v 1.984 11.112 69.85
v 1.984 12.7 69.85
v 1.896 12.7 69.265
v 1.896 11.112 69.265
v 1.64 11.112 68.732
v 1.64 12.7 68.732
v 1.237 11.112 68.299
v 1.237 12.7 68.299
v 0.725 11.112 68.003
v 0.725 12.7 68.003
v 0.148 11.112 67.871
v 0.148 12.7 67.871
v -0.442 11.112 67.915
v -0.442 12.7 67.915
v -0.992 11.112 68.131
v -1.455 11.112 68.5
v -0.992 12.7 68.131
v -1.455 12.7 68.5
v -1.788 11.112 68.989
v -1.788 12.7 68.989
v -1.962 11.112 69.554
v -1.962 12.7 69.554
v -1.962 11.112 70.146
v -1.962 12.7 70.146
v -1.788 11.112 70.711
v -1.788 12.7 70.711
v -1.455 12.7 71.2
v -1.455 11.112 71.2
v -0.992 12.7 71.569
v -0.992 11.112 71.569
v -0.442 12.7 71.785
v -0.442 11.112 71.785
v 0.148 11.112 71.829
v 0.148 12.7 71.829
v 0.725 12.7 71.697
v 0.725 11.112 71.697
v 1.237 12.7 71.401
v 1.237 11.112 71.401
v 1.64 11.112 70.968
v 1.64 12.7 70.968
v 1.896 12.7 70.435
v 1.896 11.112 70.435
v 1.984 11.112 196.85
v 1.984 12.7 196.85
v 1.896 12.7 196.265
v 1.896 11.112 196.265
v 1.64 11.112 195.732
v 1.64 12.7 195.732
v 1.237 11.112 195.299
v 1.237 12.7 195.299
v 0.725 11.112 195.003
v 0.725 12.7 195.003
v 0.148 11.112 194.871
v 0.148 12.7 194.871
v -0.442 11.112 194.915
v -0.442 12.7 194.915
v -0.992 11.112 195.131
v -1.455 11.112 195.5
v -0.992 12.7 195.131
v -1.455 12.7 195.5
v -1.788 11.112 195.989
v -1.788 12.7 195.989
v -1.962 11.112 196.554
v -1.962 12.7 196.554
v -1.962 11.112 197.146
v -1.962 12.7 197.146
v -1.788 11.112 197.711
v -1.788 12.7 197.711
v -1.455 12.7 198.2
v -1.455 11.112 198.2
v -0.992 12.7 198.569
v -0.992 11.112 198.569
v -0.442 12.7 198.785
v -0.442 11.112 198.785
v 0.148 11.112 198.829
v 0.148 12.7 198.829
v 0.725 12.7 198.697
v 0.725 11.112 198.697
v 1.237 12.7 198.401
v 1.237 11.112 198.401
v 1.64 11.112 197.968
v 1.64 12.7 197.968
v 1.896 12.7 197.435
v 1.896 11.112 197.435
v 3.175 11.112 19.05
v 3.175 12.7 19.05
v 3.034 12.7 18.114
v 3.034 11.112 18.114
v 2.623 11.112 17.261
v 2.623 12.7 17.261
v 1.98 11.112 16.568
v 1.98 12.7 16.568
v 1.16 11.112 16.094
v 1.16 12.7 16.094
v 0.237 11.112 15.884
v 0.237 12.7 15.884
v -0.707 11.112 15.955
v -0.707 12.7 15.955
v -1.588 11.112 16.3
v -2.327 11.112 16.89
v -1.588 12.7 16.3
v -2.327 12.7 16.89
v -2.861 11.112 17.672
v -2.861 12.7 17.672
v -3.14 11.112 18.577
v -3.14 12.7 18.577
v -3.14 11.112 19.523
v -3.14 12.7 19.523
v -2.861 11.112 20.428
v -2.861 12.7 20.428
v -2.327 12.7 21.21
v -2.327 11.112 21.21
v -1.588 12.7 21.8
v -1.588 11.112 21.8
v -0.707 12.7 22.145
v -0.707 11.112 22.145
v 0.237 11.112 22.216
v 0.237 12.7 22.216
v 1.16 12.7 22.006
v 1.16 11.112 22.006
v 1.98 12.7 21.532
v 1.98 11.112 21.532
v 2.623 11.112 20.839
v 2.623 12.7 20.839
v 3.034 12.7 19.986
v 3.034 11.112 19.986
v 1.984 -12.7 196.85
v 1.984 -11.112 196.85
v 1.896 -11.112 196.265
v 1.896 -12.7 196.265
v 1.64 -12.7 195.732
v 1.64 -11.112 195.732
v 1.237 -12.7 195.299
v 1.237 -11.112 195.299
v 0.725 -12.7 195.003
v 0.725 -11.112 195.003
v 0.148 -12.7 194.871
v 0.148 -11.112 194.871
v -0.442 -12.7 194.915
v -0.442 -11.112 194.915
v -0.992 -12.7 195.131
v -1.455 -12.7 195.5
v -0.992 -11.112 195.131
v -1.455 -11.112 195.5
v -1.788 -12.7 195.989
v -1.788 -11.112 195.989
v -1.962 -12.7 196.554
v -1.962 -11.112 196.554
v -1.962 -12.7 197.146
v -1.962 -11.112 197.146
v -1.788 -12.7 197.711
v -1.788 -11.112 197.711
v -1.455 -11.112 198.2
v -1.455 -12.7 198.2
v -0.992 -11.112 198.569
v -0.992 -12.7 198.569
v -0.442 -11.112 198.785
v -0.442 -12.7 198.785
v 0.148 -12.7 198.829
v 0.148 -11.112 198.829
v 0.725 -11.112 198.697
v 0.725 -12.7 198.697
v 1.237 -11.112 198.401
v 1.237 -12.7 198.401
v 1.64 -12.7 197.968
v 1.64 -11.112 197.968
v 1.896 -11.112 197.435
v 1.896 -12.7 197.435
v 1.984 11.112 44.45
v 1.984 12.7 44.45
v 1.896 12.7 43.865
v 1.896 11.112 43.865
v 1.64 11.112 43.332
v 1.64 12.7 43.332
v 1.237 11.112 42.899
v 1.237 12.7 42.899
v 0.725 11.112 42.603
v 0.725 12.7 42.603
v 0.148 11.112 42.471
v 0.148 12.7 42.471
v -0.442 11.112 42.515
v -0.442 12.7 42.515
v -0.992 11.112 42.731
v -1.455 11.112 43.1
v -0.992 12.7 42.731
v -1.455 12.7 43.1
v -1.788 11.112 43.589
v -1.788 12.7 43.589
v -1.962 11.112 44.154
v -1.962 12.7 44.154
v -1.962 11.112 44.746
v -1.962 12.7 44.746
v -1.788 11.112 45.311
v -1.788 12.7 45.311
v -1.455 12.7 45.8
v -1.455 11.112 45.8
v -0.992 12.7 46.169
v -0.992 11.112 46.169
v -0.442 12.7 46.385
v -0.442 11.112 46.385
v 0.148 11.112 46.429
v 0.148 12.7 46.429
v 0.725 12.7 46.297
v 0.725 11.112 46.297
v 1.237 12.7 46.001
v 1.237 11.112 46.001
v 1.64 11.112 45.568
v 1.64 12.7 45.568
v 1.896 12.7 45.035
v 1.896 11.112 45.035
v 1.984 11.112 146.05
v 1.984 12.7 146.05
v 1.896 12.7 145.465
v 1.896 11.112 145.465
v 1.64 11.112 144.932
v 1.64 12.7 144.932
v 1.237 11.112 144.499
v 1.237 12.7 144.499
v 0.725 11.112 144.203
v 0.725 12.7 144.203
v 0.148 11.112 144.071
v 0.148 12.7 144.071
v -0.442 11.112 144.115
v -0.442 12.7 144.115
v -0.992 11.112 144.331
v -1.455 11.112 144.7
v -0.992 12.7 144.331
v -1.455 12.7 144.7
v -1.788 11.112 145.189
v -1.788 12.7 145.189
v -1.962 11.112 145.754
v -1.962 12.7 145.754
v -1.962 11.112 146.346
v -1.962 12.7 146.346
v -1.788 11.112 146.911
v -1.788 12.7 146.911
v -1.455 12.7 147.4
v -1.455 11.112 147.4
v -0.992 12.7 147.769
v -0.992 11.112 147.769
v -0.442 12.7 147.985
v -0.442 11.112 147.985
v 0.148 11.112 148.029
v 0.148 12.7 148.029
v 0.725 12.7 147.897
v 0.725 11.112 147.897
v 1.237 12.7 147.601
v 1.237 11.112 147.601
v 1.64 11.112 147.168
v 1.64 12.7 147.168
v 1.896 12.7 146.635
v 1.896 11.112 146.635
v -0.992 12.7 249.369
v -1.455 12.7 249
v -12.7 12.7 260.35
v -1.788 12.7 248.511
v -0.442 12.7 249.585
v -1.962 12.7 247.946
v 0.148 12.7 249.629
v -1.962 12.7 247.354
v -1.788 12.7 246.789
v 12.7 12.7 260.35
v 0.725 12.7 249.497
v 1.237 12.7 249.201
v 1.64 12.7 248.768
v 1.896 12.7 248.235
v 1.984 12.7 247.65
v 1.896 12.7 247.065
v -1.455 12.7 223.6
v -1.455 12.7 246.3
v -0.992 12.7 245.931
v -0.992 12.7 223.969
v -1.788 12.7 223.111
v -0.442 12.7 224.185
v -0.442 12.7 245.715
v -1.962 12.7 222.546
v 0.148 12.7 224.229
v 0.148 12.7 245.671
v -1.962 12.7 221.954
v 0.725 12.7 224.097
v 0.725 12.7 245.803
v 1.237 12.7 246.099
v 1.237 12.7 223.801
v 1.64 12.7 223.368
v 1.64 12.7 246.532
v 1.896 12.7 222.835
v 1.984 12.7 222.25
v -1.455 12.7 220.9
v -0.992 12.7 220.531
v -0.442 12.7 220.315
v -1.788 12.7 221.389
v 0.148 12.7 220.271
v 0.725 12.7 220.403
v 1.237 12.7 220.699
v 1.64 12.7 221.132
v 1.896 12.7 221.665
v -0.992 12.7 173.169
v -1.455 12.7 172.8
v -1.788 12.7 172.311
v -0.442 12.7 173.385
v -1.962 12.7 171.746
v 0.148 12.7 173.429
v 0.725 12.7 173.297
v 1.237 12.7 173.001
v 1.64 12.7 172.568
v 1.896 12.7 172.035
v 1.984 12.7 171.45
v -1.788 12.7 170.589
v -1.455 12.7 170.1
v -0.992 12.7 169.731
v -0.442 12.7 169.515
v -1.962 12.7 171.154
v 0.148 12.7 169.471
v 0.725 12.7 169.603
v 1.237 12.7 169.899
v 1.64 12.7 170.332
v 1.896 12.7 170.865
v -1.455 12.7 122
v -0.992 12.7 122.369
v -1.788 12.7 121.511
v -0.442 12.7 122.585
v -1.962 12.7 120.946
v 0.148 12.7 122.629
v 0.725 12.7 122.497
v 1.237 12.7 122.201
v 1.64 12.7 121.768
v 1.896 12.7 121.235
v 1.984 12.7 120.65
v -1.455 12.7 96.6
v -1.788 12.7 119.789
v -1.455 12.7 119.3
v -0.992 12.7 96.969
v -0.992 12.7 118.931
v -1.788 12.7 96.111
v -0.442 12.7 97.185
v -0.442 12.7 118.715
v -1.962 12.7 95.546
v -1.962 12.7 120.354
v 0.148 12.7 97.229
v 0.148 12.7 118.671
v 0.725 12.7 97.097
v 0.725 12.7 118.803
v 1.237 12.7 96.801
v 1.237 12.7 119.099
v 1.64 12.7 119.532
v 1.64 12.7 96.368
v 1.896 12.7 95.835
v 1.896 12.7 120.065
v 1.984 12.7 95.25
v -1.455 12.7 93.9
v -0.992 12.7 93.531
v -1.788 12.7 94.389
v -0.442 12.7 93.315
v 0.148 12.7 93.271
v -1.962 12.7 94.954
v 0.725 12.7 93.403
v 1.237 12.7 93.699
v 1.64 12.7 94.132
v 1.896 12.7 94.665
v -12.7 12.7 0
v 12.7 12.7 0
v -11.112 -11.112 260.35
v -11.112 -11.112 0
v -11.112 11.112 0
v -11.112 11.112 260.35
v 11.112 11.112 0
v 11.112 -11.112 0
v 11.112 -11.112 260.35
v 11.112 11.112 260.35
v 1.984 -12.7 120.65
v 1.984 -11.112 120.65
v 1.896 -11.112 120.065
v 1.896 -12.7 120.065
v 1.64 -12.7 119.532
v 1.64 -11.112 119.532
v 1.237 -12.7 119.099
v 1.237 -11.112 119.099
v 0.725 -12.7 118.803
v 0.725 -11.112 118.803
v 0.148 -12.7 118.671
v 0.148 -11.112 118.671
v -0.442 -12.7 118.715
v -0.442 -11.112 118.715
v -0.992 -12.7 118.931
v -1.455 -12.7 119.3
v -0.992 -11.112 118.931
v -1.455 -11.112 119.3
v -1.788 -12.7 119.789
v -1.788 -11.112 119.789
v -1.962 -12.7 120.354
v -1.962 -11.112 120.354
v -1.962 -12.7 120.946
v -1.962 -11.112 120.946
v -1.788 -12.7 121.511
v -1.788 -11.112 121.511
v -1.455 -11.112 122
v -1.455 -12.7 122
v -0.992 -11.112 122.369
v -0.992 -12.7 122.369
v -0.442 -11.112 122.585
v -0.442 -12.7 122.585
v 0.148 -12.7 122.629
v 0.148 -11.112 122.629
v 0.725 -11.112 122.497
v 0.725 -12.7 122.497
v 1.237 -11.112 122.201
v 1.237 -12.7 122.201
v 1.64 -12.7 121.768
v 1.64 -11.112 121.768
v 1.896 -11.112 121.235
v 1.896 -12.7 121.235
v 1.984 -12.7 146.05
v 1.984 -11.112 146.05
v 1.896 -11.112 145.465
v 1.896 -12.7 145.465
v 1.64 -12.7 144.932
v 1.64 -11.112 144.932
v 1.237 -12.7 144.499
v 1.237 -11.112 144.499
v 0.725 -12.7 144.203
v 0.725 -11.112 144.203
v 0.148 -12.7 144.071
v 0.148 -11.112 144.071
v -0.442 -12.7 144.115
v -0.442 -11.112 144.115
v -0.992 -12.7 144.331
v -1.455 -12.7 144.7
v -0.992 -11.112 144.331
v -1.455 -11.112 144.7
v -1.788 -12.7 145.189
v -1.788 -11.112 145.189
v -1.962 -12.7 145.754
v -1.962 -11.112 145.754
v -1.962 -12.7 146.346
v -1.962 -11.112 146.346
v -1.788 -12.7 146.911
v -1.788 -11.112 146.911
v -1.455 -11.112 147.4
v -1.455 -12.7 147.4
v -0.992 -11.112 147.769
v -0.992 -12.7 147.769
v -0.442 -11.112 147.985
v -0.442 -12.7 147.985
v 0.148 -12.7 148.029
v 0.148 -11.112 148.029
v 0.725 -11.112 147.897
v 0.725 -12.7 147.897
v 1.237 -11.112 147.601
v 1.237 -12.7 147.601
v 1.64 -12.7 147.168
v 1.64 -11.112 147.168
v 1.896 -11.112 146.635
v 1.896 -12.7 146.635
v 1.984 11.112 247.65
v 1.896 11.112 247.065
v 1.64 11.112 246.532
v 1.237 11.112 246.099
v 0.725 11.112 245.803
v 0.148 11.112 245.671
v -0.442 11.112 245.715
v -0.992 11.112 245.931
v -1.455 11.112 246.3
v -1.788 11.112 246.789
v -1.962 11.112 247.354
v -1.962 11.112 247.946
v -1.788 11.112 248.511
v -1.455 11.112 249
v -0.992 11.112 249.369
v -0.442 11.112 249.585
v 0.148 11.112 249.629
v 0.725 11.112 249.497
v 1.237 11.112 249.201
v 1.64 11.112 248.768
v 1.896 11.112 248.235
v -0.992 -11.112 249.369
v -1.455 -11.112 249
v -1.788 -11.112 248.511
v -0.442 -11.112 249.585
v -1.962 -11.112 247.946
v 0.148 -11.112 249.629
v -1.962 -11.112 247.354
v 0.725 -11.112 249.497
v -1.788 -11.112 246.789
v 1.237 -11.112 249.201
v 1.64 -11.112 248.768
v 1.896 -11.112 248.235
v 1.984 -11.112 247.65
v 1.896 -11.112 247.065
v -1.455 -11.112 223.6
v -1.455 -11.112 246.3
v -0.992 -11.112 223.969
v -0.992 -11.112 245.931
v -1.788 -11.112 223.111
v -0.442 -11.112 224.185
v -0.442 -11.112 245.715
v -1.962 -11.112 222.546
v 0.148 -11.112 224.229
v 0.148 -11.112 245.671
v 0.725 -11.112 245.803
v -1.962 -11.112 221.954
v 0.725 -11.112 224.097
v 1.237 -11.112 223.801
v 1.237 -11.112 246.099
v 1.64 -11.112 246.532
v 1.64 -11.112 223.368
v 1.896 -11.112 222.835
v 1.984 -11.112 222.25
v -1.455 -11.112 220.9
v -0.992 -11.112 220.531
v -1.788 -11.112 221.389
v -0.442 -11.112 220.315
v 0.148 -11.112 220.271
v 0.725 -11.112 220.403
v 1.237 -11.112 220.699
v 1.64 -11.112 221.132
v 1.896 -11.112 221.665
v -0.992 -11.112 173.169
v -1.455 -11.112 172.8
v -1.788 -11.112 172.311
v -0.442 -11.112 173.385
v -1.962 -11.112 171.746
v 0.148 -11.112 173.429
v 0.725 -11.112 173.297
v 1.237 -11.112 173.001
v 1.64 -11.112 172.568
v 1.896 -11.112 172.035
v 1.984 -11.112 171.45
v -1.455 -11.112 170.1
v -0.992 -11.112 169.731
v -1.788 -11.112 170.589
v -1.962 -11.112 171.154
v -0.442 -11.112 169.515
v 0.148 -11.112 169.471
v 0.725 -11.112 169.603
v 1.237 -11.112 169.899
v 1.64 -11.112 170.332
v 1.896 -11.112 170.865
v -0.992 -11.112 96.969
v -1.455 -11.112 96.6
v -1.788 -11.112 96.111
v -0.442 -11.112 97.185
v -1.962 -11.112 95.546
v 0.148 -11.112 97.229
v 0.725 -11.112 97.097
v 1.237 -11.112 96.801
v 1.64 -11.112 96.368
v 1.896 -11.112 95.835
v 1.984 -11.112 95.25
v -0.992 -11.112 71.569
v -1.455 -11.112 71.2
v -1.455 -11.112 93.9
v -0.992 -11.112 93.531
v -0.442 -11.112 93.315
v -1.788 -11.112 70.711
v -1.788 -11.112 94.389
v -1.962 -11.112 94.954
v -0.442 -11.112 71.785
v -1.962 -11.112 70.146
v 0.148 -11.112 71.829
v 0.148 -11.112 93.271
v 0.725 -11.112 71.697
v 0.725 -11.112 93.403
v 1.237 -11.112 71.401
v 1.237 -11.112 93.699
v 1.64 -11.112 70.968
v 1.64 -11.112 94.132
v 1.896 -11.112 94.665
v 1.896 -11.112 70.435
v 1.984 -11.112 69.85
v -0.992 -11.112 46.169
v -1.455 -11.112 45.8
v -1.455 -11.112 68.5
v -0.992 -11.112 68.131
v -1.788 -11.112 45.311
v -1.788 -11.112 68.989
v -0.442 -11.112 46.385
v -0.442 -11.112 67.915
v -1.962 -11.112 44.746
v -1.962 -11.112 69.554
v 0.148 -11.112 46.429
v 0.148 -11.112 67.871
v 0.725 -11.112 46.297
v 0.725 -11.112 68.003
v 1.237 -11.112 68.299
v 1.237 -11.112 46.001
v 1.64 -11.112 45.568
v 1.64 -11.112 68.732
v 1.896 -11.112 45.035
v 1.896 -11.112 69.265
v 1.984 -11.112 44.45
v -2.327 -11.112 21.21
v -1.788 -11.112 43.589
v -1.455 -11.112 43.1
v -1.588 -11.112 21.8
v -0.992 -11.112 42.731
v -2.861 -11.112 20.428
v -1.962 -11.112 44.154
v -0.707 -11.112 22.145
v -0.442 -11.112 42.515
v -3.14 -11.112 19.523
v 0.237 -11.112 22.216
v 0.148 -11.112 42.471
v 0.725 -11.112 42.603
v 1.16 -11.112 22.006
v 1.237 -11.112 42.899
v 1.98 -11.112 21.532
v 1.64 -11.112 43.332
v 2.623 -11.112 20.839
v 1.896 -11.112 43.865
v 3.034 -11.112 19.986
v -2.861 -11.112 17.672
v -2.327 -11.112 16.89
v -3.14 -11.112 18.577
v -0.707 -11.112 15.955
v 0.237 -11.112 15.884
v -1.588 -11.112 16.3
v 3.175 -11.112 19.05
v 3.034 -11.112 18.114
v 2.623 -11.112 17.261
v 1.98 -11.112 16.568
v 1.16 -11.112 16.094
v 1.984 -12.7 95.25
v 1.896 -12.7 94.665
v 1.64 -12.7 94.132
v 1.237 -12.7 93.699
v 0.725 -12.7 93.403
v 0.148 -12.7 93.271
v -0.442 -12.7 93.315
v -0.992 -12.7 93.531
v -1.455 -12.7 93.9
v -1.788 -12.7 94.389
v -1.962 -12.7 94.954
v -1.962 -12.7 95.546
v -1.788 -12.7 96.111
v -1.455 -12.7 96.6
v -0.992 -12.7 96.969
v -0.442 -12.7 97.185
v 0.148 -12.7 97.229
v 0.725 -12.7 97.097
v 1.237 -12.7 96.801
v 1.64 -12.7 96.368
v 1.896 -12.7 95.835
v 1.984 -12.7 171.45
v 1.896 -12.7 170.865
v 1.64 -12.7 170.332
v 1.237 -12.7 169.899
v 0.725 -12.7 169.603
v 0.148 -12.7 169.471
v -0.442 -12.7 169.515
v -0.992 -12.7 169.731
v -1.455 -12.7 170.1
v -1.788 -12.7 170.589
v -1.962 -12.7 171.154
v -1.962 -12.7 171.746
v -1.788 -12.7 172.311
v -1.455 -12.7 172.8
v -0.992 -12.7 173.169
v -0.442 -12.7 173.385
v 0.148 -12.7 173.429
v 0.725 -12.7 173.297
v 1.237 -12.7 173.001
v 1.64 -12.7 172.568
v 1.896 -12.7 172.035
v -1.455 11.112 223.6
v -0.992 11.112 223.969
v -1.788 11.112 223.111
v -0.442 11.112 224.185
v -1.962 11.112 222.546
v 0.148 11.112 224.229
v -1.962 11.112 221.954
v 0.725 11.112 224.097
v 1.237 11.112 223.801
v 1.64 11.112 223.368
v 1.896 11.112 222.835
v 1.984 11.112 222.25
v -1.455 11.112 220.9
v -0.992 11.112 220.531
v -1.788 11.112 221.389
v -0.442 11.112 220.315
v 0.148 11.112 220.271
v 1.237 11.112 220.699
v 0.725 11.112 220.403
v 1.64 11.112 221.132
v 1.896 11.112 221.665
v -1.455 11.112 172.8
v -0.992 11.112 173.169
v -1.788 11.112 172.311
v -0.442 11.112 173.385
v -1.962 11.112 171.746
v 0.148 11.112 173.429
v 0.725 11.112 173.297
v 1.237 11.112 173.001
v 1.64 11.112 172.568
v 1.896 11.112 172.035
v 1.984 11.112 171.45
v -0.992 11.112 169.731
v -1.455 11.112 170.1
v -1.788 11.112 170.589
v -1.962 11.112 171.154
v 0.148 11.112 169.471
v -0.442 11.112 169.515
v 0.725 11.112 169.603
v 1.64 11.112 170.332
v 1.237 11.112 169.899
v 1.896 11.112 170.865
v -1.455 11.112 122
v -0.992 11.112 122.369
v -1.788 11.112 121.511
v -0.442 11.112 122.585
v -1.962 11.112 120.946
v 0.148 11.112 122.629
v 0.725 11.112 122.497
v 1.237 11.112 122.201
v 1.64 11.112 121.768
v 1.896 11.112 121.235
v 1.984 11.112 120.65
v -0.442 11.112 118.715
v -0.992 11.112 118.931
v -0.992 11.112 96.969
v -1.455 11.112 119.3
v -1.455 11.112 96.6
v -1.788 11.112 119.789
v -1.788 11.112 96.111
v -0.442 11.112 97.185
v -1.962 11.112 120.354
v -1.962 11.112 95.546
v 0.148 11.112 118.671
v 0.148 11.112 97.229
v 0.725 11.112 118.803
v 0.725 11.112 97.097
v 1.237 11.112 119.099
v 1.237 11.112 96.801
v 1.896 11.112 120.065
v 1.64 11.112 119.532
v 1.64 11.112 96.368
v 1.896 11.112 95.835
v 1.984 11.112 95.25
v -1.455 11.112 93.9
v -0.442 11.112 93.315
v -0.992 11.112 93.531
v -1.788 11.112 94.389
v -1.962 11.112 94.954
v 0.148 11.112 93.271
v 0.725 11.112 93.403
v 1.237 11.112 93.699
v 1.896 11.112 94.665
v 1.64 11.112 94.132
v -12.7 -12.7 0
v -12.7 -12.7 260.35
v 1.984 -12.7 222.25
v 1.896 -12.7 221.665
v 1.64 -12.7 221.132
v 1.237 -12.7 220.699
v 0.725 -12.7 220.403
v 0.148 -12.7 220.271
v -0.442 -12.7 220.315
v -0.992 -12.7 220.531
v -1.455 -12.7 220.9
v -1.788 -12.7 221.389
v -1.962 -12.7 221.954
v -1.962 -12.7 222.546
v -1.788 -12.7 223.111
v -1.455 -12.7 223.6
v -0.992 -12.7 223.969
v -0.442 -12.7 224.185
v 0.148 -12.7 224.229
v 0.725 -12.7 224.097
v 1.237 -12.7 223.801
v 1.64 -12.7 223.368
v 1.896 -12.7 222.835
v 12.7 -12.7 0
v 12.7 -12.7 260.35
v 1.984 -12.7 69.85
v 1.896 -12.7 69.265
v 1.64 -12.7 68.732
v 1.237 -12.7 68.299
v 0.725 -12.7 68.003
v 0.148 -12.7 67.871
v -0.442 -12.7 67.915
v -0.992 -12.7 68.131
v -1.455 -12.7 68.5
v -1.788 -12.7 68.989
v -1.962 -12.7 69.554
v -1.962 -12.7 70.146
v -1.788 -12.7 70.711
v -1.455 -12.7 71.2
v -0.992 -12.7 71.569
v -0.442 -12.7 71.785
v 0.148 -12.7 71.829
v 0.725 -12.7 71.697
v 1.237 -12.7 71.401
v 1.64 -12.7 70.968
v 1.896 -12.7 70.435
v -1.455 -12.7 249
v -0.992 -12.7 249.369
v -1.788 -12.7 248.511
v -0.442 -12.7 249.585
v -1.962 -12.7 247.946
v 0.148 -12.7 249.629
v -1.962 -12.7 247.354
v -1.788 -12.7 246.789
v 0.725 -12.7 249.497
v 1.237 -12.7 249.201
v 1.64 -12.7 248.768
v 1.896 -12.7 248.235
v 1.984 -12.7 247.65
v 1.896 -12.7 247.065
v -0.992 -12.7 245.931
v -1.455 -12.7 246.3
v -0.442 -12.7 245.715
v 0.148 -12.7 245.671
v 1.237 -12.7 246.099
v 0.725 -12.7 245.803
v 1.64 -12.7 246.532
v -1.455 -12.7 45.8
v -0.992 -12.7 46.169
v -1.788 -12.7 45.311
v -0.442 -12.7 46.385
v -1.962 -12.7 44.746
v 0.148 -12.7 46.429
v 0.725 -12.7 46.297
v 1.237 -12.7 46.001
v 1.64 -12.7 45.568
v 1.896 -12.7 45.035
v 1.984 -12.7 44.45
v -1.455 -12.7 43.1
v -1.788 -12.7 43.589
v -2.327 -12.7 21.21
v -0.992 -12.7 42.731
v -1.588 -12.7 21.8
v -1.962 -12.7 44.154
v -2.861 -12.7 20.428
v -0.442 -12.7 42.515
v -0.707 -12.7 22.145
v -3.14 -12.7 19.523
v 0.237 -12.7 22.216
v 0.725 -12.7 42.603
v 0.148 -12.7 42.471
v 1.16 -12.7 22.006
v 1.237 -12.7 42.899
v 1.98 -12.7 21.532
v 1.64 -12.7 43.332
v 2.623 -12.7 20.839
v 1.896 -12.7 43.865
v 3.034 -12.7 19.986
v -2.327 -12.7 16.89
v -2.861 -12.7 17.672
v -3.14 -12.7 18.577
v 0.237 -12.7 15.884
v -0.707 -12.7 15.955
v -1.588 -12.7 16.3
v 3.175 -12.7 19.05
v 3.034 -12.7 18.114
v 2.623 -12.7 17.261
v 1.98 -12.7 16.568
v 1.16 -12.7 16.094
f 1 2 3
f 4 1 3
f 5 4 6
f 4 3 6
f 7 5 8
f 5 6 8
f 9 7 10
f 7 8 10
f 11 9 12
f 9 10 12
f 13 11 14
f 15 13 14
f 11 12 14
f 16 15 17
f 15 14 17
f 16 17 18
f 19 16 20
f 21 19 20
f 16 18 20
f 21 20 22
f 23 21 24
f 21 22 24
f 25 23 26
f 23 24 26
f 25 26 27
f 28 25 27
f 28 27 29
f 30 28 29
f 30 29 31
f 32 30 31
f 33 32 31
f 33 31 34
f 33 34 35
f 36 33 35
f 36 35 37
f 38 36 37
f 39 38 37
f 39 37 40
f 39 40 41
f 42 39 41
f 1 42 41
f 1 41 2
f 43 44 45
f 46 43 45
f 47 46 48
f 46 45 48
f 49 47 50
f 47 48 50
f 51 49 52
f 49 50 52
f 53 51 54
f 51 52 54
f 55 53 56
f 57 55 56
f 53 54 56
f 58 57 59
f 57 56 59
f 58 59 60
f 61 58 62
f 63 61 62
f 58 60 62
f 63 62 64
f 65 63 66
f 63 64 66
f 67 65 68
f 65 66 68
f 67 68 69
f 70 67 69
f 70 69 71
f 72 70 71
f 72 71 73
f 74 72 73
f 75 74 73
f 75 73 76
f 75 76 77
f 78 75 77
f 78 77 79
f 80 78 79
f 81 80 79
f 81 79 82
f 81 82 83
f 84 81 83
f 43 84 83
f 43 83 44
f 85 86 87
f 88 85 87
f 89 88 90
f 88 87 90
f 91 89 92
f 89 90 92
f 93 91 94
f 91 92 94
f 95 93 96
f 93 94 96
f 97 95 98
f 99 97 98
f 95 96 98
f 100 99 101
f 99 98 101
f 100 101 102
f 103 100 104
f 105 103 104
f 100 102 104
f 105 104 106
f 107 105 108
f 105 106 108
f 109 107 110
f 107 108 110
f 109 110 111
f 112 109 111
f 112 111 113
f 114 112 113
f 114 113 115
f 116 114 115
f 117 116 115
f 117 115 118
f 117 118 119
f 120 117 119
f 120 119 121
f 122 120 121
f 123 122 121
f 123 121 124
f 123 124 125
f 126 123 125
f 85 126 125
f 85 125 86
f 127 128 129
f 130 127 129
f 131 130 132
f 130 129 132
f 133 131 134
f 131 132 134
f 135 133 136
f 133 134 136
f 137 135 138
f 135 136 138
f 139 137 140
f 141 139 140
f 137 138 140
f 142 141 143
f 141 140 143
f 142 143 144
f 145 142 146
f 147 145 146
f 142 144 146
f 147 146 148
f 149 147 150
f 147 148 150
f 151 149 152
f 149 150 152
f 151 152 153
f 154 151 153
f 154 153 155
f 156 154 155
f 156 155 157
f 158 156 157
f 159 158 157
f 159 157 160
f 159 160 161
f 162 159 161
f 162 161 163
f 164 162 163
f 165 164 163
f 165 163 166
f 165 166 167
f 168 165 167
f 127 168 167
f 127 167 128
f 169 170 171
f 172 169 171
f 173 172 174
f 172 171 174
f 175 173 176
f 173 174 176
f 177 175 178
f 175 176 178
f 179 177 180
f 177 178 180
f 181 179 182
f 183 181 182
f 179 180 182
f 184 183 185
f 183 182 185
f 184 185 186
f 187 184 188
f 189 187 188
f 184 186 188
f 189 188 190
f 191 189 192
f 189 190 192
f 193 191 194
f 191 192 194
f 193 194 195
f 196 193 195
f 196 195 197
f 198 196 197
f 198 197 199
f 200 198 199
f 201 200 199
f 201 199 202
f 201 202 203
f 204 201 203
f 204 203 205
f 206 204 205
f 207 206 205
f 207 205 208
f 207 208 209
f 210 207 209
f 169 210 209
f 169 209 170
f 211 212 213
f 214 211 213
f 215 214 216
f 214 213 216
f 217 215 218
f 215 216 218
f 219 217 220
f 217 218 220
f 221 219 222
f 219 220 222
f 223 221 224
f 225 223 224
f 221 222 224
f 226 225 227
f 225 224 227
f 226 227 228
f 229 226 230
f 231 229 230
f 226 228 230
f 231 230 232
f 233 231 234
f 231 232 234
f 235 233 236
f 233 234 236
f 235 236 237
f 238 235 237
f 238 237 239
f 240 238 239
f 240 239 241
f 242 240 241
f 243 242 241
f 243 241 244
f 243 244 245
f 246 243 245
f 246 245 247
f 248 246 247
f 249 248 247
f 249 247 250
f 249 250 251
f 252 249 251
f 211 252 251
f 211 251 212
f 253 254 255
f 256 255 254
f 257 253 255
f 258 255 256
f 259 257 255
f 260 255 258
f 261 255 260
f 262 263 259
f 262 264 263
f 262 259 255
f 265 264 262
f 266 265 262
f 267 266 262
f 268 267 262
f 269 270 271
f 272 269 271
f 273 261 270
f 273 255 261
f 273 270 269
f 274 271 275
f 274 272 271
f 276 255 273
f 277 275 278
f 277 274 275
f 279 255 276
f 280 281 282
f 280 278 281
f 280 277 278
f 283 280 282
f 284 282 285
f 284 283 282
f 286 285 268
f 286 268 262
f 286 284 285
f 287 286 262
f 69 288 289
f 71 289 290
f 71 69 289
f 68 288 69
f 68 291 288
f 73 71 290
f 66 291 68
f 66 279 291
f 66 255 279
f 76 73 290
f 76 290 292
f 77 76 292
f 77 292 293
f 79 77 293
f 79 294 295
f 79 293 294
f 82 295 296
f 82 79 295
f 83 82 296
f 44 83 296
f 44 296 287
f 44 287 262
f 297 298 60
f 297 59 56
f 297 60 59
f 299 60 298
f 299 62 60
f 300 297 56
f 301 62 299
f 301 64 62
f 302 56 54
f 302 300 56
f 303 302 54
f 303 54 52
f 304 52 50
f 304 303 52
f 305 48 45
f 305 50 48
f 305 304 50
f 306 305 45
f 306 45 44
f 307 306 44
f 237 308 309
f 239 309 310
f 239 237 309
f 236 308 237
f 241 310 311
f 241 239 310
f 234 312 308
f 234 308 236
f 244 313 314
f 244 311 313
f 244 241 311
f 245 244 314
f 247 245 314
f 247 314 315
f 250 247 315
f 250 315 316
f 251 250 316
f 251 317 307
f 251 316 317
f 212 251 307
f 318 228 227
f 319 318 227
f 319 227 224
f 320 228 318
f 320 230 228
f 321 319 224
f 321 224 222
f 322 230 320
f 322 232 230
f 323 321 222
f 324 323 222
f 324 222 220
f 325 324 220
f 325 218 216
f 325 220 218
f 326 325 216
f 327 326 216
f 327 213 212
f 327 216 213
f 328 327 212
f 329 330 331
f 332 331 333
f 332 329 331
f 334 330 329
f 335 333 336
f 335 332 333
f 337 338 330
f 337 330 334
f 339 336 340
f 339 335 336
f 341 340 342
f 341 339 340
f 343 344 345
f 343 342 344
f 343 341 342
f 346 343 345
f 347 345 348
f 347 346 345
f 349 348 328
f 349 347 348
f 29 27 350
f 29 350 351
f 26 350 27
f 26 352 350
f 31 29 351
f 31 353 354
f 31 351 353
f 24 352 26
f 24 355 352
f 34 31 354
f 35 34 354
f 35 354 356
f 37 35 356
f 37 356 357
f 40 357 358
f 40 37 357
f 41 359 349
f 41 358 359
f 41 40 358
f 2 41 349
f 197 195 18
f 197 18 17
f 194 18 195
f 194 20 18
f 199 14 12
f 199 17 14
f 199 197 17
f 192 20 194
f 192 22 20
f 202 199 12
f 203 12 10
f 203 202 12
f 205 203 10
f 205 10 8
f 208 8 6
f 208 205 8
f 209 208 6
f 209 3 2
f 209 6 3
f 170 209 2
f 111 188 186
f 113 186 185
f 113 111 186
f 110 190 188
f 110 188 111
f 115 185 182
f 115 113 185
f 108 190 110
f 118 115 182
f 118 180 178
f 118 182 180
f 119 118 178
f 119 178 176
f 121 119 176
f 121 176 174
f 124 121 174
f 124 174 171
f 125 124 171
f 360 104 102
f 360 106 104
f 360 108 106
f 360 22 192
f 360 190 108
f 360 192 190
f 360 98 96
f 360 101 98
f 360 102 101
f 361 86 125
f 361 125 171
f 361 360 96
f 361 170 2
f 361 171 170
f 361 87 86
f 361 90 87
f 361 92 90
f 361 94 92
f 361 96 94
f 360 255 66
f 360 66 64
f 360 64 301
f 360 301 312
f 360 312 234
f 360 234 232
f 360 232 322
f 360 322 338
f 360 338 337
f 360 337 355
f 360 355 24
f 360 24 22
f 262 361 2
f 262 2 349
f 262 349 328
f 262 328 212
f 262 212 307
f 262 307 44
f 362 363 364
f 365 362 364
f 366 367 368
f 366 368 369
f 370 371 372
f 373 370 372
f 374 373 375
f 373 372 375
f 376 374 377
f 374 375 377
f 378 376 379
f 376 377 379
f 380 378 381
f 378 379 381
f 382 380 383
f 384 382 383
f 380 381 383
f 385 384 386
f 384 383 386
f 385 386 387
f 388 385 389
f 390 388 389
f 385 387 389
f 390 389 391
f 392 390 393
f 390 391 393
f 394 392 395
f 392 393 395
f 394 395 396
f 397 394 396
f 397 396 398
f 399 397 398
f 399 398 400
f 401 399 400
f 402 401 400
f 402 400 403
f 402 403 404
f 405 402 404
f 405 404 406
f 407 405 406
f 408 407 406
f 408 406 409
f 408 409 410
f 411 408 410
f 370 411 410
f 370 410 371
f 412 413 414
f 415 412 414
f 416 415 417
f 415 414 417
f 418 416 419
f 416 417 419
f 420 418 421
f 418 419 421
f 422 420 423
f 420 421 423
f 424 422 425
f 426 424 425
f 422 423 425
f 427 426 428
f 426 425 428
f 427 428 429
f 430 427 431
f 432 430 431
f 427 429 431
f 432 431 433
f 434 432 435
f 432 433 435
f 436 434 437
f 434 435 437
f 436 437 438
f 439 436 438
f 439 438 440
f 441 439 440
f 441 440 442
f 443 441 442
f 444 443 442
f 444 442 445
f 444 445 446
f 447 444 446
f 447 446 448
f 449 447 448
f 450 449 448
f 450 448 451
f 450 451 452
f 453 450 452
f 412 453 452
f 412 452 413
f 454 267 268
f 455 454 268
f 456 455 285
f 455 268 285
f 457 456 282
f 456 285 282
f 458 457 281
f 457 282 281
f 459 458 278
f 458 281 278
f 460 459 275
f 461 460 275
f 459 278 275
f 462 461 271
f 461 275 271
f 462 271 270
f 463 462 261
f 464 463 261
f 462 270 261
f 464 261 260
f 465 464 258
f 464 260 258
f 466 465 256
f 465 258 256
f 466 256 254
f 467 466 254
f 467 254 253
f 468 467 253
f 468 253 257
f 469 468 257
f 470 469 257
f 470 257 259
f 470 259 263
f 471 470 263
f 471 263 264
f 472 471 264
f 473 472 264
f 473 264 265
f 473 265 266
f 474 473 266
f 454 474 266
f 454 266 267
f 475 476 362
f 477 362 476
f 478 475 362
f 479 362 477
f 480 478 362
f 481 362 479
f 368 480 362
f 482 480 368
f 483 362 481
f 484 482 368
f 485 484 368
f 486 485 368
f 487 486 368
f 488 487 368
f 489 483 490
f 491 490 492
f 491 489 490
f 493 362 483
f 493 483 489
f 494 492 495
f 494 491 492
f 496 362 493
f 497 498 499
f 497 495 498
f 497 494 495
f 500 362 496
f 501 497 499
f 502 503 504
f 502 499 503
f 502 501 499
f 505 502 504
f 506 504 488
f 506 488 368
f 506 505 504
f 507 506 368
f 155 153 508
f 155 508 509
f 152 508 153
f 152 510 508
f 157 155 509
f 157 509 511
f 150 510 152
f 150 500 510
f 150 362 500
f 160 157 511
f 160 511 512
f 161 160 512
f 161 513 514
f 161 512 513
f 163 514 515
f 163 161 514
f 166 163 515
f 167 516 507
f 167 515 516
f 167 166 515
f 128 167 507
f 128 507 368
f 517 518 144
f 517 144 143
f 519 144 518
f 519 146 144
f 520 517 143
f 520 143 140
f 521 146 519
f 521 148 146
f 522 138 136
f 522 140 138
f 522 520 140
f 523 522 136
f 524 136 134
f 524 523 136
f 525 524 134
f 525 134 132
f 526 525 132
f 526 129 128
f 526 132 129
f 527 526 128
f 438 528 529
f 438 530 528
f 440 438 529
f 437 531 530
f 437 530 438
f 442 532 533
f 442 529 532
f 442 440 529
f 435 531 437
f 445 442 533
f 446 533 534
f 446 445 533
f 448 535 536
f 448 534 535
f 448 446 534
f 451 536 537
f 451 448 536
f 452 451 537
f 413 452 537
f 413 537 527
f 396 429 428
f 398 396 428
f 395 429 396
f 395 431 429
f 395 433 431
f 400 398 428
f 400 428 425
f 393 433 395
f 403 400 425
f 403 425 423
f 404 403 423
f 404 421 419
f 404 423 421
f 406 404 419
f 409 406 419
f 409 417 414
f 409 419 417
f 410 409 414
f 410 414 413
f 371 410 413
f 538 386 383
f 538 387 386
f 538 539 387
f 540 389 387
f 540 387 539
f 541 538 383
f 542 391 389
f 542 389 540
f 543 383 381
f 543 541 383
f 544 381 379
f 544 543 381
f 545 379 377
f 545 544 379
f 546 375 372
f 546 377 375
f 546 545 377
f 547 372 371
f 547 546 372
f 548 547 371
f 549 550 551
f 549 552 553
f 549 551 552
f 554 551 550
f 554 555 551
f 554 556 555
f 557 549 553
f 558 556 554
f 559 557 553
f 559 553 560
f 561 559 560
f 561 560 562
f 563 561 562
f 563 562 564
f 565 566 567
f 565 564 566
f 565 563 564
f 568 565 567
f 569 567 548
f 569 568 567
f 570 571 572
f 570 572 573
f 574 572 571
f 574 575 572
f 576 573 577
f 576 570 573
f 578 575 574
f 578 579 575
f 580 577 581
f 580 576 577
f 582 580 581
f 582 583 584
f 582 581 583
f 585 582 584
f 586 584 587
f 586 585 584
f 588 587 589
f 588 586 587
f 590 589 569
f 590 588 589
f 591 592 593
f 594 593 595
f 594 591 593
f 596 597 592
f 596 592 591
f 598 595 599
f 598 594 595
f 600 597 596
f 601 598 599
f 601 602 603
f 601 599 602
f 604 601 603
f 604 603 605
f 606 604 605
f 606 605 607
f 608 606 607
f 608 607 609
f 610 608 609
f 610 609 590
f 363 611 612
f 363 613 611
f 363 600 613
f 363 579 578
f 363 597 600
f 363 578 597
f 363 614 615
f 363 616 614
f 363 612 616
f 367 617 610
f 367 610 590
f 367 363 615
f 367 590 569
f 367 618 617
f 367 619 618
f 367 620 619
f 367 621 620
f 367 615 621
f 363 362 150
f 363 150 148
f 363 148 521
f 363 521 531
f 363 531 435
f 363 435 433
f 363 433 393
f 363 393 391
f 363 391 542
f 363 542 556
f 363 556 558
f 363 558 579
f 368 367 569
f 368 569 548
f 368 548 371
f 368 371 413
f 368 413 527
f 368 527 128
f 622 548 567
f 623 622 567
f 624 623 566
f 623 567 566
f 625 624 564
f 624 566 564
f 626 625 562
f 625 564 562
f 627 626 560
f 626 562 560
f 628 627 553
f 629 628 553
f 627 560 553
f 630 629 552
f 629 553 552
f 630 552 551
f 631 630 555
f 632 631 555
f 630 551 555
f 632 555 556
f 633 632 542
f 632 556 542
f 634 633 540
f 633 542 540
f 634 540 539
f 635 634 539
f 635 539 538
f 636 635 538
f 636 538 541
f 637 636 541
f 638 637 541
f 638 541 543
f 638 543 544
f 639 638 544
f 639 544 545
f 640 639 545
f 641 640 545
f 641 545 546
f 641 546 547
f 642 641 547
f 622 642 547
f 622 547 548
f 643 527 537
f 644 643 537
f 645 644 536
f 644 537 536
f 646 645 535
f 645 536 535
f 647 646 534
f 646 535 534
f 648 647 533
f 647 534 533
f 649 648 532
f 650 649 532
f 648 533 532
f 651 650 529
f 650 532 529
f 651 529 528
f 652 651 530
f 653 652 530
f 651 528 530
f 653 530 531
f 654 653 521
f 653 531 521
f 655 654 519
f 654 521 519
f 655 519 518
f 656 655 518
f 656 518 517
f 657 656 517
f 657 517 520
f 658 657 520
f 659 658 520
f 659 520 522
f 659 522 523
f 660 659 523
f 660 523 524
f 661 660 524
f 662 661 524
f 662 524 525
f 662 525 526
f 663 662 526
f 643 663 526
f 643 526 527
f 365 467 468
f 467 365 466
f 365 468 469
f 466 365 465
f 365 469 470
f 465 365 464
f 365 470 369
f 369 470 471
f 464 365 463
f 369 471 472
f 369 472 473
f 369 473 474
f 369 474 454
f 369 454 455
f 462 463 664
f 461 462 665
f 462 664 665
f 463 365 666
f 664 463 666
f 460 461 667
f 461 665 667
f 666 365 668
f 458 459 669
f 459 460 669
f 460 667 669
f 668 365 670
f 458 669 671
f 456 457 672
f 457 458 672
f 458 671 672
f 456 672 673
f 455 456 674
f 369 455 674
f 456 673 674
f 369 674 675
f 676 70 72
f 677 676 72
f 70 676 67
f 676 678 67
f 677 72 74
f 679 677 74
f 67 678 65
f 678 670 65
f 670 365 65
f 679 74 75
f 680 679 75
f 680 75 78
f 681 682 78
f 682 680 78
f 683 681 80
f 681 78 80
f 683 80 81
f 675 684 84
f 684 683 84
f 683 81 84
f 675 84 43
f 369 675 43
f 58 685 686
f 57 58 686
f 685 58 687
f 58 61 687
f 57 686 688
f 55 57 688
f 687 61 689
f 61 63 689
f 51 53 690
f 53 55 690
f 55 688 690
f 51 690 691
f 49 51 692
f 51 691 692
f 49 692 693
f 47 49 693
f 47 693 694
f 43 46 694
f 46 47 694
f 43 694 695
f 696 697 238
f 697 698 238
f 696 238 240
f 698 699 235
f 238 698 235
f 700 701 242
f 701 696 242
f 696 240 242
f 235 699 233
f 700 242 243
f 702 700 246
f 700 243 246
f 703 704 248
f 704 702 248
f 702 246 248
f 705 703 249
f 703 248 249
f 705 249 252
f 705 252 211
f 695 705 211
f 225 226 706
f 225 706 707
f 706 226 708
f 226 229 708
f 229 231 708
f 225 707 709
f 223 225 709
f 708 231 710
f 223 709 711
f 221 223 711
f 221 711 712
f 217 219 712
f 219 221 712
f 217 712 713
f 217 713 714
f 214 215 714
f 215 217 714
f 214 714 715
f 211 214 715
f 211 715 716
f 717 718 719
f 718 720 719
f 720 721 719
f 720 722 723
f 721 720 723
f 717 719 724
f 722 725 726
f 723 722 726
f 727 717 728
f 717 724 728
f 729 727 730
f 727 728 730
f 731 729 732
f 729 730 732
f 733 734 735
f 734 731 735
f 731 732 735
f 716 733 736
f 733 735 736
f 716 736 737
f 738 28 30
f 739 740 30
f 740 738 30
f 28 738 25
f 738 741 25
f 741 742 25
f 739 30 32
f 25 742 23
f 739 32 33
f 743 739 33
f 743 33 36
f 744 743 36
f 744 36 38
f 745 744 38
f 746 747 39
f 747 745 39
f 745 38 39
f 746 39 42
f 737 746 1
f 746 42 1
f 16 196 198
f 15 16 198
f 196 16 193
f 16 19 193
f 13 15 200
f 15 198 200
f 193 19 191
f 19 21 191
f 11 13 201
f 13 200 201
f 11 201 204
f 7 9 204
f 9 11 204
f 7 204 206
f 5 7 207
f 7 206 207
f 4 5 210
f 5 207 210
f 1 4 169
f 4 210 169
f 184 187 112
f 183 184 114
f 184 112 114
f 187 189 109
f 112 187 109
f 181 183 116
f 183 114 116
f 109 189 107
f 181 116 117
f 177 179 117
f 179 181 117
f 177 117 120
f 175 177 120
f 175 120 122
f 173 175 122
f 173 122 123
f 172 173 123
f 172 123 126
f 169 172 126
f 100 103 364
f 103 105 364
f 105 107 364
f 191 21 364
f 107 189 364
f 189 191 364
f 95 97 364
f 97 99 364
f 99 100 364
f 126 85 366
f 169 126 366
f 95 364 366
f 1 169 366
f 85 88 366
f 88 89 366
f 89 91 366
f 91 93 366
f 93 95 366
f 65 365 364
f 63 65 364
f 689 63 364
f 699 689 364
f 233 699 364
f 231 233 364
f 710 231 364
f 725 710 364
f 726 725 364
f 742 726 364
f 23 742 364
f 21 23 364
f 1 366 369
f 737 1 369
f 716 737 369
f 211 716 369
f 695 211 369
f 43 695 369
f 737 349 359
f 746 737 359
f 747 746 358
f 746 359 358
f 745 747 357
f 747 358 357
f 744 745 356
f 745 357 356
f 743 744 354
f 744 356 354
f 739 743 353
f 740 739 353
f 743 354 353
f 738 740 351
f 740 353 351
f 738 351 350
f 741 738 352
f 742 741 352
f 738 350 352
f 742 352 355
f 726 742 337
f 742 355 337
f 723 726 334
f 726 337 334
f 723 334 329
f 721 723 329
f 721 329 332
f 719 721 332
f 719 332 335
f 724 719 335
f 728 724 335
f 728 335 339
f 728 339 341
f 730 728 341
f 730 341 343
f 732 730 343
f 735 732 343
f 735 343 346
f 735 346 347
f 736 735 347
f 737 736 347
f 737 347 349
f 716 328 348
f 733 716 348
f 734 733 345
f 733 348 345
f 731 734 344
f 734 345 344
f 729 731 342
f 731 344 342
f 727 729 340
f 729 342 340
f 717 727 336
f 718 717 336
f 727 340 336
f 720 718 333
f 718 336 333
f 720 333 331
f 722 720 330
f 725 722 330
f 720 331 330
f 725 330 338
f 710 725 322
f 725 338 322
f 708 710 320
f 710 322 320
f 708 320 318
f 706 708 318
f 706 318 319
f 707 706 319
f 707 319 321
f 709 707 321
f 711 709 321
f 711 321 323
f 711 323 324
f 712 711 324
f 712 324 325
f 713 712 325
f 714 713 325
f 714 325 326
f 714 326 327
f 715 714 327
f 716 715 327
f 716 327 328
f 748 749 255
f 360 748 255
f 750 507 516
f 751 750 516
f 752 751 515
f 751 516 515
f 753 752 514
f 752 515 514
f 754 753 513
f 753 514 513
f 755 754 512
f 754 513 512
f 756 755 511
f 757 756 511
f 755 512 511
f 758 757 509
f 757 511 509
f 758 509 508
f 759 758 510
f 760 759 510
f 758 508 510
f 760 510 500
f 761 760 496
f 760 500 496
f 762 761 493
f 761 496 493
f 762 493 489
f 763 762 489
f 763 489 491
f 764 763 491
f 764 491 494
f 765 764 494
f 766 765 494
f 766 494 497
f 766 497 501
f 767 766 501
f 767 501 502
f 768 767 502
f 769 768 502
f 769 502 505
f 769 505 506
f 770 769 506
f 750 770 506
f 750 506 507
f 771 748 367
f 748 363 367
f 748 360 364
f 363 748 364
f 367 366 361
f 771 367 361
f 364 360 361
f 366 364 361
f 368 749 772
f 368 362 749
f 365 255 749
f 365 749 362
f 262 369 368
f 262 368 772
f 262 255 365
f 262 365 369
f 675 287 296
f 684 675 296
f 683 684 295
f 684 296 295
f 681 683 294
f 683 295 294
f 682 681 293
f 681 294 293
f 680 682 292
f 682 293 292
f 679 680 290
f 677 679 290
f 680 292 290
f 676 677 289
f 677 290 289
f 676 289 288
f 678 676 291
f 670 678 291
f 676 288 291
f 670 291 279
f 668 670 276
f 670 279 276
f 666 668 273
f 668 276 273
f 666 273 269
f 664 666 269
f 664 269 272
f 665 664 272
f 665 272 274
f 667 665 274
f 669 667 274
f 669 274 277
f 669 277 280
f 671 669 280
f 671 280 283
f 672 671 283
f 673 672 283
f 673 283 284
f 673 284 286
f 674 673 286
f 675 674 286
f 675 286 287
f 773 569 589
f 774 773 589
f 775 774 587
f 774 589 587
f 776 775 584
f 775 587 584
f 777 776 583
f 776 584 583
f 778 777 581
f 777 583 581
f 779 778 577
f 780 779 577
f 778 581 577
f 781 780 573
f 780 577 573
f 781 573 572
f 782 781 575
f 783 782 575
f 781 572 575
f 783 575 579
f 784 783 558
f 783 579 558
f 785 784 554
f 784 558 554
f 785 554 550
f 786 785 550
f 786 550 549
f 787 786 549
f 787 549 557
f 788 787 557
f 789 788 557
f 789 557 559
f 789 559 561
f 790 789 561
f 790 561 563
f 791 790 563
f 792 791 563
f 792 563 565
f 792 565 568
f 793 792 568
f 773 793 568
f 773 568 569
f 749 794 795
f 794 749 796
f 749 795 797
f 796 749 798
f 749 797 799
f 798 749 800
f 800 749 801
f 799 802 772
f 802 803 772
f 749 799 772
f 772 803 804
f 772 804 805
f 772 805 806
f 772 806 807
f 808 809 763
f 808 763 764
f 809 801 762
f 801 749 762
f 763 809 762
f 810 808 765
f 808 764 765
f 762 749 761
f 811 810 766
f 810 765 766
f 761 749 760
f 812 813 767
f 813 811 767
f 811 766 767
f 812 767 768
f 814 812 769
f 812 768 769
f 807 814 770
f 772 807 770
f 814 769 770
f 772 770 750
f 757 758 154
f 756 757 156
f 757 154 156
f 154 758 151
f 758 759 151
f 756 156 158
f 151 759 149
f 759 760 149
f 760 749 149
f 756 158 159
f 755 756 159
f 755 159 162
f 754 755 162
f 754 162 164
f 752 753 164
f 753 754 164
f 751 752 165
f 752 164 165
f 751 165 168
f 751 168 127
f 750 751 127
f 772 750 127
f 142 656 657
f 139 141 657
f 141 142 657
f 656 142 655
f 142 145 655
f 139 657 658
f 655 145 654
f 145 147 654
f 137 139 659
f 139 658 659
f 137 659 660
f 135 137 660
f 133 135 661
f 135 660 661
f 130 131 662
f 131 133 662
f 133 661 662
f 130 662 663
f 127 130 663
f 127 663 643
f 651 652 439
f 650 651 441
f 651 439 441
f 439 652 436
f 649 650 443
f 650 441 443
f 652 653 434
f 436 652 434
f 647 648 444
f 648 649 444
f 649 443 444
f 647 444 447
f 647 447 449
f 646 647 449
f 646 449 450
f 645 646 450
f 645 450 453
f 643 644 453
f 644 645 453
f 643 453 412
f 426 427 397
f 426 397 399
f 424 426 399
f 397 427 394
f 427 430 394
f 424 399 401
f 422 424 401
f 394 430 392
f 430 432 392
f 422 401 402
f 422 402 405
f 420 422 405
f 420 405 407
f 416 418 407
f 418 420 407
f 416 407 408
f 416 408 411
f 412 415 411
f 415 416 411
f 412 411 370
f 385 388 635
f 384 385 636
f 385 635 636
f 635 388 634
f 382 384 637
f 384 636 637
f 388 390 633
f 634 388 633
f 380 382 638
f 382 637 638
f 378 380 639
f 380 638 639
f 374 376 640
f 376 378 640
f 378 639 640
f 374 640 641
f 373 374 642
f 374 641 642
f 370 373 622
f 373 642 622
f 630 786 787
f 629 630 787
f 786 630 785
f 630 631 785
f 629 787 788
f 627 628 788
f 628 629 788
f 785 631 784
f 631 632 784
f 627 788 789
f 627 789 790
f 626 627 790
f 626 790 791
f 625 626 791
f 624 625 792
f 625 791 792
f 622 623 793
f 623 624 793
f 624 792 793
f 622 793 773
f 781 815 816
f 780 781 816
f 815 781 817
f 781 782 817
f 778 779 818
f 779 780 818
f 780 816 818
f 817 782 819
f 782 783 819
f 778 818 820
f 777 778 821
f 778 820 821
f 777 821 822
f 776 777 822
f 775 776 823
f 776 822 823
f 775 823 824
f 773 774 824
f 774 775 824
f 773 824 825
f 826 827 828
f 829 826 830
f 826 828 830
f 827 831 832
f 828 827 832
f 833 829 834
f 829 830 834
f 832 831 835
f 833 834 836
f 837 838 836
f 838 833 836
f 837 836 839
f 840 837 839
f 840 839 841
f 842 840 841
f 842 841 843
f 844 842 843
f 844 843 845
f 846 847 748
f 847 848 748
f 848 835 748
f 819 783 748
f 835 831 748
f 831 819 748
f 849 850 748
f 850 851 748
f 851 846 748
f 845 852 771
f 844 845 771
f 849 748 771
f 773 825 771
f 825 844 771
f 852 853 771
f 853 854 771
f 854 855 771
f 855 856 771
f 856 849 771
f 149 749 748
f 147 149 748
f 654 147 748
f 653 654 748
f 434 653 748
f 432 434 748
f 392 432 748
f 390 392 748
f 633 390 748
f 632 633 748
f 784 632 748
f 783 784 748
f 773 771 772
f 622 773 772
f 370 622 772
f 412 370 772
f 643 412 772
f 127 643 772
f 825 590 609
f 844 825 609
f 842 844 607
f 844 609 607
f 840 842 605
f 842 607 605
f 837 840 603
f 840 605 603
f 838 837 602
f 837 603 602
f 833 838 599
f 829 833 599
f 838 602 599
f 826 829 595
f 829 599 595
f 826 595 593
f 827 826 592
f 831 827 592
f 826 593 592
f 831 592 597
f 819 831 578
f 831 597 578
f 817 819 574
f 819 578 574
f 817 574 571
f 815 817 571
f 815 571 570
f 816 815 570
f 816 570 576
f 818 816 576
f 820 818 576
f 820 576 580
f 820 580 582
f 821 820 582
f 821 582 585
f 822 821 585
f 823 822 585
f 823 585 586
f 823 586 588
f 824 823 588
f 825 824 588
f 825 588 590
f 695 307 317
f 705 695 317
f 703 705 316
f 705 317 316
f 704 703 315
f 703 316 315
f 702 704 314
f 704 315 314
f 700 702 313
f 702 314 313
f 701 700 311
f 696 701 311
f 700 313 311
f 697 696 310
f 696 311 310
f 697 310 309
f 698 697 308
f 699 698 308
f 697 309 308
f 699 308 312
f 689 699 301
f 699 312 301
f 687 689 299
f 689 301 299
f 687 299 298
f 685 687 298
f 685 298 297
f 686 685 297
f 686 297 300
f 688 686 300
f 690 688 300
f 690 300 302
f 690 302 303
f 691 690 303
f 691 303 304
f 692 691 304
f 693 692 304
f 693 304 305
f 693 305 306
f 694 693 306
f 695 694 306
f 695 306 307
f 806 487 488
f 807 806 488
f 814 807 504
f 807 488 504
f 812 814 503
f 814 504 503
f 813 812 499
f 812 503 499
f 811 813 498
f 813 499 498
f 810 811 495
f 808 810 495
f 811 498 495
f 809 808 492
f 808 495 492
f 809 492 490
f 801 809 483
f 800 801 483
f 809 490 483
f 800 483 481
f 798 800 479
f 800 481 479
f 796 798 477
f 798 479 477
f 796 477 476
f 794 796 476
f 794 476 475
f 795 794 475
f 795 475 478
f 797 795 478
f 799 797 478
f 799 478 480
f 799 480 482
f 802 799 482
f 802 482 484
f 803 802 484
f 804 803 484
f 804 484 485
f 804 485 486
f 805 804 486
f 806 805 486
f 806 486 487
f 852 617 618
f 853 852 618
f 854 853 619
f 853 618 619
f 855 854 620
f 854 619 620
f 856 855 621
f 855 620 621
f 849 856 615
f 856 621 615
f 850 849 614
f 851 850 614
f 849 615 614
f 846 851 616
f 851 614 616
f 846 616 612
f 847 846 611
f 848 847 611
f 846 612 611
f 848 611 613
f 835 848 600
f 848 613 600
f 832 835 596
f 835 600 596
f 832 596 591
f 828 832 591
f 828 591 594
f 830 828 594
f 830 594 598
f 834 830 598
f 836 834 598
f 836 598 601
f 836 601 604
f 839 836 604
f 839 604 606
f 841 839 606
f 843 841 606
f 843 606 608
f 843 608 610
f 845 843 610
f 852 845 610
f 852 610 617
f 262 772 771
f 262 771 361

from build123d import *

# Parameters (mm, degrees)
SKETCH1_W           = 25.4
SKETCH1_H           = 25.4
SKETCH1_W_2         = 22.225
SKETCH1_H_2         = 22.225
BOSS_EXTRUDE1_DEPTH = 260.35
SKETCH2_R           = 1.984375
SKETCH2_R_2         = 3.175
CUT_EXTRUDE1_DEPTH  = 26.4


with BuildPart() as part:
    # Sketch1 → Boss-Extrude1 (new body)
    with BuildSketch(Plane.XY):
        Rectangle(SKETCH1_W, SKETCH1_H)
        Rectangle(SKETCH1_W_2, SKETCH1_H_2, mode=Mode.SUBTRACT)
    extrude(amount=BOSS_EXTRUDE1_DEPTH)

    # Sketch2 → Cut-Extrude1 (cut, through all)
    with BuildSketch(Plane(origin=(0, 12.7, 0), x_dir=(1, 0, 0), z_dir=(0, 1, 0))):
        with Locations((0, -247.65)):
            Circle(SKETCH2_R)
        with Locations((0, -222.25)):
            Circle(SKETCH2_R)
        with Locations((0, -196.85)):
            Circle(SKETCH2_R)
        with Locations((0, -171.45)):
            Circle(SKETCH2_R)
        with Locations((0, -146.05)):
            Circle(SKETCH2_R)
        with Locations((0, -120.65)):
            Circle(SKETCH2_R)
        with Locations((0, -95.25)):
            Circle(SKETCH2_R)
        with Locations((0, -69.85)):
            Circle(SKETCH2_R)
        with Locations((0, -44.45)):
            Circle(SKETCH2_R)
        with Locations((0, 6.35)):
            Circle(SKETCH2_R)
        with Locations((0, 31.75)):
            Circle(SKETCH2_R)
        with Locations((0, -19.05)):
            Circle(SKETCH2_R_2)
    extrude(amount=-CUT_EXTRUDE1_DEPTH, mode=Mode.SUBTRACT)


solid = part.part
